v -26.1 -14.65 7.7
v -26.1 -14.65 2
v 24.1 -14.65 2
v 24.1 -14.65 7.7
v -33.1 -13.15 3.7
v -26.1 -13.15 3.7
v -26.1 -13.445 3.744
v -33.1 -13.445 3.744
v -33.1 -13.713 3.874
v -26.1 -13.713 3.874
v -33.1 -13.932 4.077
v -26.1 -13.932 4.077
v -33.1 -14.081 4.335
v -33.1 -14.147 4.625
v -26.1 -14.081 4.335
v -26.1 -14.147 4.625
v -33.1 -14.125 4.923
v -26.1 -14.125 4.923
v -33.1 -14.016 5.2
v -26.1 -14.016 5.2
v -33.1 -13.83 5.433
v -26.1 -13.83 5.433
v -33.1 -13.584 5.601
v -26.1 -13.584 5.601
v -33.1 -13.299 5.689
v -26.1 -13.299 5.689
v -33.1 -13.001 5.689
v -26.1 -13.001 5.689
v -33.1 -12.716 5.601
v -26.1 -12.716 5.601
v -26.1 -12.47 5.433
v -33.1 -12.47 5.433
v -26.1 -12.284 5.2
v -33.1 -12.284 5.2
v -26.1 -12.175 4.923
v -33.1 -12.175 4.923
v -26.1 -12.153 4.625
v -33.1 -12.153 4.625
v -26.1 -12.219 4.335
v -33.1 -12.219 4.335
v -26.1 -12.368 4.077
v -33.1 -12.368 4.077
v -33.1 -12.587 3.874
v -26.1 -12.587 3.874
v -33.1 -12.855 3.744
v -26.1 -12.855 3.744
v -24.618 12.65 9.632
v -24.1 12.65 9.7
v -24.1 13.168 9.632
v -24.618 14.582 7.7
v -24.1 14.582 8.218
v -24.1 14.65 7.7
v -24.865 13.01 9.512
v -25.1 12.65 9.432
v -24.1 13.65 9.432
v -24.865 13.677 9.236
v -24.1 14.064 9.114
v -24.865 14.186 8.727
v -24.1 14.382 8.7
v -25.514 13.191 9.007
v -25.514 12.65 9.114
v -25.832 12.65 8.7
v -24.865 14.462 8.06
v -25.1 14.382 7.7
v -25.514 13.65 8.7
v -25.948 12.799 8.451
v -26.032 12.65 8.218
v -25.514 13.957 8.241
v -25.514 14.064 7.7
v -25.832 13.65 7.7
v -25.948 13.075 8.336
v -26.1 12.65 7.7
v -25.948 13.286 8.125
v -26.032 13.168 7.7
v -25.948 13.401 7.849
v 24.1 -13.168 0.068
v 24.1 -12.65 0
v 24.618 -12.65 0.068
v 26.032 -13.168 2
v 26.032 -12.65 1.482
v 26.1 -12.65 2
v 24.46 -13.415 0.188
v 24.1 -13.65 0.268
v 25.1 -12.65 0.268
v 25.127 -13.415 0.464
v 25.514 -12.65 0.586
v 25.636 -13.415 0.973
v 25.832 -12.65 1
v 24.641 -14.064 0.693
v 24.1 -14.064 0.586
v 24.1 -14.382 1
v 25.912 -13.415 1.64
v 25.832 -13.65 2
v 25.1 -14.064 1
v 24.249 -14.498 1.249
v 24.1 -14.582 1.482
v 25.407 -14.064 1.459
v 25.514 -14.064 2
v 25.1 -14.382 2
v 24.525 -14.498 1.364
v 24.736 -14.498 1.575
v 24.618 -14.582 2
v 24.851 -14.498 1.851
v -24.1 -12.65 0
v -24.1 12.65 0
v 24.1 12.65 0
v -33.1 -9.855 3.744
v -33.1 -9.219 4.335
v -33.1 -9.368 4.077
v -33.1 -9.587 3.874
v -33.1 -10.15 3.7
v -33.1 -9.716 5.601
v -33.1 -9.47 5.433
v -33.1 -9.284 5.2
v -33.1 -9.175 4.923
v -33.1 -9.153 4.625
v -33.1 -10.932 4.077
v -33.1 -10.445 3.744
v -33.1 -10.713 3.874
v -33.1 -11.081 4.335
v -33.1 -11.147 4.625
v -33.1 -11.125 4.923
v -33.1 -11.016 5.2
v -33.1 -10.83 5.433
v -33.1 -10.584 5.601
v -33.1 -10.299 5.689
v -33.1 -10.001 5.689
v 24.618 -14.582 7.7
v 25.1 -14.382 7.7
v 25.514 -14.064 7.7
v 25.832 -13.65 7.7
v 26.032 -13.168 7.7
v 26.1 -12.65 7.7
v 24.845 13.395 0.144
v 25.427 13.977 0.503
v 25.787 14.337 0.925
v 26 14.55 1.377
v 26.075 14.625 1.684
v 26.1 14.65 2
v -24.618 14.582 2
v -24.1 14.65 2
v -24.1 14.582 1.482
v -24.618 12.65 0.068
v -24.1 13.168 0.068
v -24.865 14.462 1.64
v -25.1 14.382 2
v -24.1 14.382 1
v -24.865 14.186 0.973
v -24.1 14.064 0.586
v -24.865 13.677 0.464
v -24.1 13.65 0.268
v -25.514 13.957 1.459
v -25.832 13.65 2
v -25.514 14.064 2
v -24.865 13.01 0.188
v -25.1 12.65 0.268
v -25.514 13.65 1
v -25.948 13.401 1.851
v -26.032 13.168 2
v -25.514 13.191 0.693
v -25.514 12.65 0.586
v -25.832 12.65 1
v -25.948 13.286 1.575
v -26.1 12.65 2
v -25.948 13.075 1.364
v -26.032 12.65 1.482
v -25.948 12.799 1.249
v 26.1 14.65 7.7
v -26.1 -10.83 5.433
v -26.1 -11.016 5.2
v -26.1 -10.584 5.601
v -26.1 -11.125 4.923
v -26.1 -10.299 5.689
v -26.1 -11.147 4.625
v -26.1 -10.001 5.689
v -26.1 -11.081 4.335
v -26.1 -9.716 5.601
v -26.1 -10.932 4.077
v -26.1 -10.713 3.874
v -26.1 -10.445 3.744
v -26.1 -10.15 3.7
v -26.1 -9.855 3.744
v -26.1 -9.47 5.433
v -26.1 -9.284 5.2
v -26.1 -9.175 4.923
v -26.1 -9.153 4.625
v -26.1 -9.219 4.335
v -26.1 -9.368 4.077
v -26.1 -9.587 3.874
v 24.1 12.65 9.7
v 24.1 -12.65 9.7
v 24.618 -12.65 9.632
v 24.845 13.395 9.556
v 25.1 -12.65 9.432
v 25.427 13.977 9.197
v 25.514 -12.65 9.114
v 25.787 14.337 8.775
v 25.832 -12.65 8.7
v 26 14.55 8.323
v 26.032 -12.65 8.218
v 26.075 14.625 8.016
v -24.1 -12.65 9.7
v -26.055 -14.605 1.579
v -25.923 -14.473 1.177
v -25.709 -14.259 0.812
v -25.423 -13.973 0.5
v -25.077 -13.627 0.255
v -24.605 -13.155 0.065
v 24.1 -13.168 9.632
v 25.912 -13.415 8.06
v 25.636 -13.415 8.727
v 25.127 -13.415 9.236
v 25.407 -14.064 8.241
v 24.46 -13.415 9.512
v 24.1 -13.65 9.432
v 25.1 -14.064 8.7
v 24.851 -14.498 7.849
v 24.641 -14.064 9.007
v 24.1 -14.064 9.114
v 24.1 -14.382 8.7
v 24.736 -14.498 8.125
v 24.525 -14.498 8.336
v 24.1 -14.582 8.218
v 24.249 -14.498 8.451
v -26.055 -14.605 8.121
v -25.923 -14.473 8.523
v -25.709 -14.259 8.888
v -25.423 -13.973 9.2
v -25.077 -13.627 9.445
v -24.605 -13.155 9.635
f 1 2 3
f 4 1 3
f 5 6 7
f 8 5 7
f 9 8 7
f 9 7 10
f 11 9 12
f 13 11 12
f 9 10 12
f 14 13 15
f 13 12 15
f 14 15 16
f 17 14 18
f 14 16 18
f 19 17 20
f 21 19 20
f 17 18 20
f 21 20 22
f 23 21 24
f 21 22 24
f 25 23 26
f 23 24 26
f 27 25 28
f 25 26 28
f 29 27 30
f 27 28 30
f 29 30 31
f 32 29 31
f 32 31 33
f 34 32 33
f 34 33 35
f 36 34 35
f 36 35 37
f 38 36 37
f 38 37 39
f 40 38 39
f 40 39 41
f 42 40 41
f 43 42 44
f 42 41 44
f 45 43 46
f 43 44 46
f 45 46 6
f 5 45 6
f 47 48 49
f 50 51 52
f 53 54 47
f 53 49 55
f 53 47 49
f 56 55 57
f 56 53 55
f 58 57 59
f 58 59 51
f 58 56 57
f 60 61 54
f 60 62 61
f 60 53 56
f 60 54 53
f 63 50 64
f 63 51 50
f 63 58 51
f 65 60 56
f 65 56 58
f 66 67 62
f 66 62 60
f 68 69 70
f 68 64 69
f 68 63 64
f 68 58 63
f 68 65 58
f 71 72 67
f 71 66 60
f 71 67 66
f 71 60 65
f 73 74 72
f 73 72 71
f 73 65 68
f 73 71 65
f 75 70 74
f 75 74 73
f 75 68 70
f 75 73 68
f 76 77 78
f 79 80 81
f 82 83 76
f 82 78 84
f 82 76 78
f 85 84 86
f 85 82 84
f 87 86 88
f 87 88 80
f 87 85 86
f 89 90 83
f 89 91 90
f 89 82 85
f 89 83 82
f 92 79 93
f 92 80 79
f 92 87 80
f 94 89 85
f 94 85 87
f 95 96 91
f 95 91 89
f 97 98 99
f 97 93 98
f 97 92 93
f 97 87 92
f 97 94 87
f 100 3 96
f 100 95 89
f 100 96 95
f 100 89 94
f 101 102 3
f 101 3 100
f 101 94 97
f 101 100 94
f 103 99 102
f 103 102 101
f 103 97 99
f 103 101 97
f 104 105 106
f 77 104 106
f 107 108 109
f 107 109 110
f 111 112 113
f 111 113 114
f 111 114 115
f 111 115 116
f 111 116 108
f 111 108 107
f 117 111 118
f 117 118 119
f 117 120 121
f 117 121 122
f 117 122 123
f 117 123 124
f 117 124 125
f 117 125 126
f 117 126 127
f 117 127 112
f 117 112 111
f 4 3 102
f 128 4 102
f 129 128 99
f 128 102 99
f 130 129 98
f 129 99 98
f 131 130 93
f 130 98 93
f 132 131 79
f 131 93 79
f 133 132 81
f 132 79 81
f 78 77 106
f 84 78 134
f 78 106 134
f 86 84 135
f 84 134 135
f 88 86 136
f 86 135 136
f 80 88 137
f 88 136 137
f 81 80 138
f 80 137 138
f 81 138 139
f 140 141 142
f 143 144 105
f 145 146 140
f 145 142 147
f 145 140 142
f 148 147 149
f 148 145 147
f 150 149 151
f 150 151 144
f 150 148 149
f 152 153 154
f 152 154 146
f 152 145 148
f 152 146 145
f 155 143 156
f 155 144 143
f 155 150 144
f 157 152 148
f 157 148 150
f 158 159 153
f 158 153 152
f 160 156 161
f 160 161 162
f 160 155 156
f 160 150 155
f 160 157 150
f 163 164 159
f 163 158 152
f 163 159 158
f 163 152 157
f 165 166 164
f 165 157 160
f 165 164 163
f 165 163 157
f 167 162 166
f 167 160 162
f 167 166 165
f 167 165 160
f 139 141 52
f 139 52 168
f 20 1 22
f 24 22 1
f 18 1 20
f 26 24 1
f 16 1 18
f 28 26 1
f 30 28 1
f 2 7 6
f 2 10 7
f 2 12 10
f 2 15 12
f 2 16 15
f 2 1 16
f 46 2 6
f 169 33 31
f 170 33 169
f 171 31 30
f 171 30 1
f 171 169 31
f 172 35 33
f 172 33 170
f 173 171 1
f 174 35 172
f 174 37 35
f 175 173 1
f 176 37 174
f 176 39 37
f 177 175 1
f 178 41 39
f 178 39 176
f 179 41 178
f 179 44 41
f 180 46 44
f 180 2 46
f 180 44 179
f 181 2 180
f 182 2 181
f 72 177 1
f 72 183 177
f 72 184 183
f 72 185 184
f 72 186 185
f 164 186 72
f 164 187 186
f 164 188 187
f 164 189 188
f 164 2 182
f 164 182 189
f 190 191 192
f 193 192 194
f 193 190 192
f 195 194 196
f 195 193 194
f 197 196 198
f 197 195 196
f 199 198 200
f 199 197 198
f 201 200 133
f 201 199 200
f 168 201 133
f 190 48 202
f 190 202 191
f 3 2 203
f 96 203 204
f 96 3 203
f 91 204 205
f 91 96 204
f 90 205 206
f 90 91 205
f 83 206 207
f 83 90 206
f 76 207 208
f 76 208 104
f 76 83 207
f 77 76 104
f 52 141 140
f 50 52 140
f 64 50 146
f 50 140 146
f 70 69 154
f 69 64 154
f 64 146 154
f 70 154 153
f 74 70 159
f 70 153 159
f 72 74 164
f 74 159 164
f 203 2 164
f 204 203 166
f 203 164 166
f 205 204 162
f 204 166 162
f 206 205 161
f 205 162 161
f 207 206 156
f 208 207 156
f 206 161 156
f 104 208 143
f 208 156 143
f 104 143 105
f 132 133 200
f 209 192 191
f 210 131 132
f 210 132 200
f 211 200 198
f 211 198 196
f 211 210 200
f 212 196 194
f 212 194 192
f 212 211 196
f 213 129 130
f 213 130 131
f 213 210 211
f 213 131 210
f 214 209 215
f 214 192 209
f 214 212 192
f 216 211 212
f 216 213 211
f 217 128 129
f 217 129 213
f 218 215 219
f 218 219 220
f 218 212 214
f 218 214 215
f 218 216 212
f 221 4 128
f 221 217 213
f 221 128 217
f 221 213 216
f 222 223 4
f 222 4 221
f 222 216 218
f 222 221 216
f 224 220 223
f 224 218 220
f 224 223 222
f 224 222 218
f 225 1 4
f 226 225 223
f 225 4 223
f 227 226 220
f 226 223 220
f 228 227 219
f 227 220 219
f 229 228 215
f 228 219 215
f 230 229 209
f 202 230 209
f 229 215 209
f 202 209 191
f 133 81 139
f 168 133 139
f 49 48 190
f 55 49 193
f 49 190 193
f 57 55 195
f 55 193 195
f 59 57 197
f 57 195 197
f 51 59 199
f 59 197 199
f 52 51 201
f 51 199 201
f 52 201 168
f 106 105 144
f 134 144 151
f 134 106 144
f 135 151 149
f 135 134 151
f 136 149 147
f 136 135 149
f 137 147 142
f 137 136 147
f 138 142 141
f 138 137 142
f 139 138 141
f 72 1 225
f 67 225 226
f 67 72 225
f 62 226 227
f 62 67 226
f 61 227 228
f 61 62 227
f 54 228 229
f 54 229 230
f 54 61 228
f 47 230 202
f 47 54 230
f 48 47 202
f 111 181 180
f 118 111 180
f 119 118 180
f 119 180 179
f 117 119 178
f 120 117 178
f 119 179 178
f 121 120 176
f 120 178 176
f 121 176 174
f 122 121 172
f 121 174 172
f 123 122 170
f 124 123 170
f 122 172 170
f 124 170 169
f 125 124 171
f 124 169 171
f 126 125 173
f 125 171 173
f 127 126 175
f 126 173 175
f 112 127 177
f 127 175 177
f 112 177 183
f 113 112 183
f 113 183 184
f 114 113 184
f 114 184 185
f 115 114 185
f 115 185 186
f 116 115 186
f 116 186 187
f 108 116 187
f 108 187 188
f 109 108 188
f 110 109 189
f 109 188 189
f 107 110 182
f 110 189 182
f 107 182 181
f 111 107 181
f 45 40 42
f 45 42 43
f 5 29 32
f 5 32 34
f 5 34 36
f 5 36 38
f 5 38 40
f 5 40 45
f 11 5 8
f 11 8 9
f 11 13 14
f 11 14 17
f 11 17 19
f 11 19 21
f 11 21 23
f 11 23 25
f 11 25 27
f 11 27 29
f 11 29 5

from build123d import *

# Parameters (mm, degrees)
SKETCH1_W           = 52.2
SKETCH1_H           = 29.3
BOSS_EXTRUDE1_DEPTH = 9.7
SKETCH2_R           = 1
BOSS_EXTRUDE2_DEPTH = 7
FILLET1_R           = 2
FILLET2_R           = 2
FILLET3_R           = 2
FILLET4_R           = 2


with BuildPart() as part:
    # Sketch1 → Boss-Extrude1 (new body)
    with BuildSketch(Plane.XY):
        Rectangle(SKETCH1_W, SKETCH1_H)
    extrude(amount=BOSS_EXTRUDE1_DEPTH)

    # Sketch2 → Boss-Extrude2 (add)
    with BuildSketch(Plane.ZY.offset(26.1)):
        with Locations(Location((4.7, -13.15, 0), (0, 0, 180))):
            Circle(SKETCH2_R)
        with Locations(Location((4.7, -10.15, 0), (0, 0, 180))):
            Circle(SKETCH2_R)
    extrude(amount=BOSS_EXTRUDE2_DEPTH)

    # Fillet1
    fillet1_edges = [part.edges().sort_by_distance(p)[0] for p in [
        (26.1, 0, 9.7),
        (0, 14.65, 9.7),
        (-26.1, 0, 9.7),
        (0, -14.65, 9.7),
    ]]
    fillet(fillet1_edges, radius=FILLET1_R)

    # Fillet2
    fillet2_edges = [part.edges().sort_by_distance(p)[0] for p in [
        (0, 14.65, 0),
        (26.1, 0, 0),
        (0, -14.65, 0),
        (-26.1, 0, 0),
    ]]
    fillet(fillet2_edges, radius=FILLET2_R)

    # Fillet3
    # the kernel refuses this fillet: 2 mm, written as the material it takes off along each edge
    with BuildSketch(Plane(origin=(-24.1, 12.65, 7.7), x_dir=(0, 1, 0), z_dir=(-1, 0, 0))) as fillet3_piece_1_section:
        Polygon((0, 0), (FILLET3_R, 0), (FILLET3_R, -FILLET3_R), (0, -FILLET3_R), align=None)
    fillet3_piece_1 = extrude(amount=FILLET3_R, mode=Mode.PRIVATE)
    fillet3_piece_1 = fillet3_piece_1 - Plane(origin=(-24.1, 12.65, 7.7), x_dir=(0, -0.7071067811865475, -0.7071067811865475), z_dir=(-1, 0, 0)) * Sphere(FILLET3_R, mode=Mode.PRIVATE)
    add(fillet3_piece_1, mode=Mode.SUBTRACT)
    with BuildSketch(Plane(origin=(-24.1, 12.65, 2), x_dir=(0, 1, 0), z_dir=(-1, 0, 0))) as fillet3_piece_2_section:
        Polygon((0, 0), (FILLET3_R, 0), (FILLET3_R, FILLET3_R), (0, FILLET3_R), align=None)
    fillet3_piece_2 = extrude(amount=FILLET3_R, mode=Mode.PRIVATE)
    fillet3_piece_2 = fillet3_piece_2 - Plane(origin=(-24.1, 12.65, 2), x_dir=(0, -0.7071067811865475, 0.7071067811865475), z_dir=(-1, 0, 0)) * Sphere(FILLET3_R, mode=Mode.PRIVATE)
    add(fillet3_piece_2, mode=Mode.SUBTRACT)
    with BuildSketch(Plane(origin=(-26.1, 14.65, 2), x_dir=(0, -1, 0), z_dir=(0, 0, 1))) as fillet3_piece_3:
        with BuildLine():
            CenterArc((FILLET3_R, FILLET3_R), FILLET3_R, 180, 90)
            Line((0, FILLET3_R), (0, 0))
            Line((0, 0), (FILLET3_R, 0))
        make_face()
    extrude(amount=5.7, mode=Mode.SUBTRACT)

    # Fillet4
    # the kernel refuses this fillet: 2 mm, written as the material it takes off along each edge
    with BuildSketch(Plane(origin=(24.1, -12.65, 7.7), x_dir=(1, 0, 0), z_dir=(0, -1, 0))) as fillet4_piece_1_section:
        Polygon((0, 0), (FILLET4_R, 0), (FILLET4_R, FILLET4_R), (0, FILLET4_R), align=None)
    fillet4_piece_1 = extrude(amount=FILLET4_R, mode=Mode.PRIVATE)
    fillet4_piece_1 = fillet4_piece_1 - Plane(origin=(24.1, -12.65, 7.7), x_dir=(-0.7071067811865475, 0, -0.7071067811865475), z_dir=(0, -1, 0)) * Sphere(FILLET4_R, mode=Mode.PRIVATE)
    add(fillet4_piece_1, mode=Mode.SUBTRACT)
    with BuildSketch(Plane(origin=(24.1, -12.65, 2), x_dir=(1, 0, 0), z_dir=(0, -1, 0))) as fillet4_piece_2_section:
        Polygon((0, 0), (FILLET4_R, 0), (FILLET4_R, -FILLET4_R), (0, -FILLET4_R), align=None)
    fillet4_piece_2 = extrude(amount=FILLET4_R, mode=Mode.PRIVATE)
    fillet4_piece_2 = fillet4_piece_2 - Plane(origin=(24.1, -12.65, 2), x_dir=(-0.7071067811865475, 0, 0.7071067811865475), z_dir=(0, -1, 0)) * Sphere(FILLET4_R, mode=Mode.PRIVATE)
    add(fillet4_piece_2, mode=Mode.SUBTRACT)
    with BuildSketch(Plane(origin=(26.1, -14.65, 2), x_dir=(-1, 0, 0), z_dir=(0, 0, 1))) as fillet4_piece_3:
        with BuildLine():
            CenterArc((FILLET4_R, -FILLET4_R), FILLET4_R, 90, 90)
            Line((0, -FILLET4_R), (0, 0))
            Line((0, 0), (FILLET4_R, 0))
        make_face()
    extrude(amount=5.7, mode=Mode.SUBTRACT)


solid = part.part
